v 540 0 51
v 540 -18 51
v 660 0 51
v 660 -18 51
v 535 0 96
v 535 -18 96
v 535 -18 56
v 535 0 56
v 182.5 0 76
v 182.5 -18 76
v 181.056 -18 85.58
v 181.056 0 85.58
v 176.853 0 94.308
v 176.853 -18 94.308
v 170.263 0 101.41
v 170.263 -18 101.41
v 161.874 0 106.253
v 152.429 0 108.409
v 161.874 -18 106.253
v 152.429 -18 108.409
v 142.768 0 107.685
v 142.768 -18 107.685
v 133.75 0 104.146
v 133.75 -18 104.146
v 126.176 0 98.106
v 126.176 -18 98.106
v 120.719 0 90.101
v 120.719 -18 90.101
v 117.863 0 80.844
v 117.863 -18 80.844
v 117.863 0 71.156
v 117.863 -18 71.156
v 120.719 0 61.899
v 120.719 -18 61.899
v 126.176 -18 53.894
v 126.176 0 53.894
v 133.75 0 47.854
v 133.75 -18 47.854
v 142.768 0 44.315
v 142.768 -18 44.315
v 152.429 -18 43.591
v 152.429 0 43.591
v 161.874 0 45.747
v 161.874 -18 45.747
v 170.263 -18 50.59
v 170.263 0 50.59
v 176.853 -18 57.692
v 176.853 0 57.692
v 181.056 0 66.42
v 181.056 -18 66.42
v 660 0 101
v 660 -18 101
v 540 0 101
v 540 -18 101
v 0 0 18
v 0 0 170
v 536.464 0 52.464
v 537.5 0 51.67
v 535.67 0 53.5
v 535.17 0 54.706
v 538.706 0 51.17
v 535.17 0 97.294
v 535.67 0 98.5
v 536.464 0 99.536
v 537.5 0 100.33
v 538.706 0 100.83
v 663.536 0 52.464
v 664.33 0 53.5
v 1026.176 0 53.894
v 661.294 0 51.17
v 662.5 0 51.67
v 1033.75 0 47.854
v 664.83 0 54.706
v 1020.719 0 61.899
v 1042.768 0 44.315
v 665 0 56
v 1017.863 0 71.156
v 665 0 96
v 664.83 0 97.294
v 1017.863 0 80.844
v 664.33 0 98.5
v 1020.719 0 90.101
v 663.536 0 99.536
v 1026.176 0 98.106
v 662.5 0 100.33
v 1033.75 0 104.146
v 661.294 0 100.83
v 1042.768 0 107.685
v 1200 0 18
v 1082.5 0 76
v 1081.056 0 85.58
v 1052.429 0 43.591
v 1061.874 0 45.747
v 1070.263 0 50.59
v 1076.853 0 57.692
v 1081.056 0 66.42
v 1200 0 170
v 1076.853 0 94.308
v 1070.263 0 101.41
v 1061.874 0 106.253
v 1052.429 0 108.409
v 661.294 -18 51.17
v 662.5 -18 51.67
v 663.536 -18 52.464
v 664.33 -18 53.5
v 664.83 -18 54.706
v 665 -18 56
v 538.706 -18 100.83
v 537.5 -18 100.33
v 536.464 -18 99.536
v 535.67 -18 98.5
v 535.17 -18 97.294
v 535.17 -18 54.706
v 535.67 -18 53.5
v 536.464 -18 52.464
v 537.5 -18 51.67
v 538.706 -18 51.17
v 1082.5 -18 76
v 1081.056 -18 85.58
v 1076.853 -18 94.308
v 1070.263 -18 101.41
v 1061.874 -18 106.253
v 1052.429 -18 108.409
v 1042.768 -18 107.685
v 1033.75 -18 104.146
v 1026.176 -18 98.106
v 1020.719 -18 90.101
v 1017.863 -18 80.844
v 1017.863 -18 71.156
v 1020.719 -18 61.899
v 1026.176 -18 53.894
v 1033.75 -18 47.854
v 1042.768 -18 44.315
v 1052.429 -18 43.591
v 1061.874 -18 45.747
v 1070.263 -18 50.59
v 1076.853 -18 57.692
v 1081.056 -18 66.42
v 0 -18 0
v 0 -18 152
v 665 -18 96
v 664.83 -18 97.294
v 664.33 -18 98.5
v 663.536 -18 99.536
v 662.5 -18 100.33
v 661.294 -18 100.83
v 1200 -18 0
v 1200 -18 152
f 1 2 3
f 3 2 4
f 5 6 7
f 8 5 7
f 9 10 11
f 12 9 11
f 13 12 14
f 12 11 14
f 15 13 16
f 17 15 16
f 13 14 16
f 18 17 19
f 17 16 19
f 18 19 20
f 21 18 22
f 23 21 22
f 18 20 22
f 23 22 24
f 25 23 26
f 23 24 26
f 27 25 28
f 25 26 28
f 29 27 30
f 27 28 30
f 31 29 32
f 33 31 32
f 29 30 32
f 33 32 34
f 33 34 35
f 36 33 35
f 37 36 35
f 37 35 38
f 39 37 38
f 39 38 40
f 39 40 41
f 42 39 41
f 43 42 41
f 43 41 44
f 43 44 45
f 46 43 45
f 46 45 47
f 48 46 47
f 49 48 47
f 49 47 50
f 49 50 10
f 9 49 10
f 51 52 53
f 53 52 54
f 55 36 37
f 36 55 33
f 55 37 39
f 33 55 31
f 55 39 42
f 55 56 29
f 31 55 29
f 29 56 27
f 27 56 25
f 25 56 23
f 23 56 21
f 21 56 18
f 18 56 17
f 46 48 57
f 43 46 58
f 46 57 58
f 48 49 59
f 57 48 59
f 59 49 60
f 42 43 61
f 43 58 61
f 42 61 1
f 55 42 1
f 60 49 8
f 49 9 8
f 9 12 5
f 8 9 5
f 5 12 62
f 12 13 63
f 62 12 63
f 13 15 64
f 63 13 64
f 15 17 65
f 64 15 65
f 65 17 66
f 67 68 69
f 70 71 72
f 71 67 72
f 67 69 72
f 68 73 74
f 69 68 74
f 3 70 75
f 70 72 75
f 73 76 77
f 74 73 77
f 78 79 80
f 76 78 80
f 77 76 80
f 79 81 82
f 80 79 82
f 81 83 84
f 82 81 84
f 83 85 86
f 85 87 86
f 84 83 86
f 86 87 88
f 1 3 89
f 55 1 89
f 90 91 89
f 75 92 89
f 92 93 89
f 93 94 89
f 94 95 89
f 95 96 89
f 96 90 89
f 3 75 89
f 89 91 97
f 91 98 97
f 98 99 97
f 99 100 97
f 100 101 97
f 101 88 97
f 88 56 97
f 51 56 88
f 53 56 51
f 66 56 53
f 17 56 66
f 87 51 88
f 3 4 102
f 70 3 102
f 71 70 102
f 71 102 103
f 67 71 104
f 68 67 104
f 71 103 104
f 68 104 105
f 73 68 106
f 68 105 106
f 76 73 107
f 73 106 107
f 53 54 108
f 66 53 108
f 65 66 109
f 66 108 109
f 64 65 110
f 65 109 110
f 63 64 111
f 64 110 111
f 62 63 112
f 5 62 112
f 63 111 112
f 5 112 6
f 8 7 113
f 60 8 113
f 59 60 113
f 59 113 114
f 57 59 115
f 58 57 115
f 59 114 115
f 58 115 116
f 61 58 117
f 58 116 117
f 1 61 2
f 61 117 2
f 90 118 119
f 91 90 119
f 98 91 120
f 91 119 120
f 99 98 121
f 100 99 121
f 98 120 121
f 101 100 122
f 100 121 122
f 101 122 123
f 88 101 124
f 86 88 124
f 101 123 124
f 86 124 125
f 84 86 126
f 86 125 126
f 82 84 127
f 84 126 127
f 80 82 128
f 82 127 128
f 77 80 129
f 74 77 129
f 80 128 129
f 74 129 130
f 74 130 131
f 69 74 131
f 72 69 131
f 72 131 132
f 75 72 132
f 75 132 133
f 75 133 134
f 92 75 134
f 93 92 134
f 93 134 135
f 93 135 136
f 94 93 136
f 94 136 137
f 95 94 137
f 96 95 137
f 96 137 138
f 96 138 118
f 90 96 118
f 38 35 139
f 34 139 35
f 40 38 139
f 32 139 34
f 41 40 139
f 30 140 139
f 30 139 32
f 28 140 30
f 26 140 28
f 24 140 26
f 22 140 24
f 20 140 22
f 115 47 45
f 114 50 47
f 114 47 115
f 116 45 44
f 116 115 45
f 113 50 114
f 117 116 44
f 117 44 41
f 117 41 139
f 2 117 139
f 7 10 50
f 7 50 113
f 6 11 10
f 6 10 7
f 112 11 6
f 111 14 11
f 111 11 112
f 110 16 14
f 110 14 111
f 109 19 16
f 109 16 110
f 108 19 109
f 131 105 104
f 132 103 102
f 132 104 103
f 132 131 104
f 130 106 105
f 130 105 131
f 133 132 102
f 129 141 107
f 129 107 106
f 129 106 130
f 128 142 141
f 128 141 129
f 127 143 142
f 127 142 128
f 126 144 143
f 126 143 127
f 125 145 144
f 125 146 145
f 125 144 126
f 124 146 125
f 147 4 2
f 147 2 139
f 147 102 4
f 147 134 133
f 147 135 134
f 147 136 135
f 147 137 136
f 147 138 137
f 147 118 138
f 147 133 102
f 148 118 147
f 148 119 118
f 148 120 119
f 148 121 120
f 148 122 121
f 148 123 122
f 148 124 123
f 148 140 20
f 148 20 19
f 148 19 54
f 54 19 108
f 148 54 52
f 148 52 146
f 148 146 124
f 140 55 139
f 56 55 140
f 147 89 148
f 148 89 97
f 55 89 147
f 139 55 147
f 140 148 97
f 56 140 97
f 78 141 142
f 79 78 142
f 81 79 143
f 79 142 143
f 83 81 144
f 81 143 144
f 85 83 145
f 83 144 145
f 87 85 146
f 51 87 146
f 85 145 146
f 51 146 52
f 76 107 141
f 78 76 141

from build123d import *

# Parameters (mm, degrees)
F0_W     = 1200
F0_H     = 170
F1_DEPTH = 18
F3_DEPTH = 1200.001
F4_R     = 32.5
F5_DEPTH = 18.001


with BuildPart() as f1:
    # F0 (on Front) → F1 (new body)
    with BuildSketch(Plane.XZ):
        with Locations((600, 85)):
            Rectangle(F0_W, F0_H)
    extrude(amount=F1_DEPTH)

    # F2 (on face) → F3 (cut, through all)
    with BuildSketch(Plane.YZ.offset(1200)):
        Polygon((-18, 152), (0, 170), (-18, 170), align=None)
        Polygon((-18, 0), (0, 0), (0, 18), align=None)
    extrude(amount=-F3_DEPTH, mode=Mode.SUBTRACT)

    # F4 (on face) → F5 (cut, through all)
    with BuildSketch(Plane.XZ.offset(18)):
        with Locations((150, 76)):
            Circle(F4_R)
        with Locations((1050, 76)):
            Circle(F4_R)
        with BuildLine():
            Line((540, 51), (660, 51))
            ThreePointArc((660, 51), (663.535534, 52.464466), (665, 56))
            Line((665, 56), (665, 96))
            ThreePointArc((665, 96), (663.535534, 99.535534), (660, 101))
            Line((660, 101), (540, 101))
            ThreePointArc((540, 101), (536.464466, 99.535534), (535, 96))
            Line((535, 96), (535, 56))
            ThreePointArc((535, 56), (536.464466, 52.464466), (540, 51))
        make_face()
    extrude(amount=-F5_DEPTH, mode=Mode.SUBTRACT)


solid = f1.part
